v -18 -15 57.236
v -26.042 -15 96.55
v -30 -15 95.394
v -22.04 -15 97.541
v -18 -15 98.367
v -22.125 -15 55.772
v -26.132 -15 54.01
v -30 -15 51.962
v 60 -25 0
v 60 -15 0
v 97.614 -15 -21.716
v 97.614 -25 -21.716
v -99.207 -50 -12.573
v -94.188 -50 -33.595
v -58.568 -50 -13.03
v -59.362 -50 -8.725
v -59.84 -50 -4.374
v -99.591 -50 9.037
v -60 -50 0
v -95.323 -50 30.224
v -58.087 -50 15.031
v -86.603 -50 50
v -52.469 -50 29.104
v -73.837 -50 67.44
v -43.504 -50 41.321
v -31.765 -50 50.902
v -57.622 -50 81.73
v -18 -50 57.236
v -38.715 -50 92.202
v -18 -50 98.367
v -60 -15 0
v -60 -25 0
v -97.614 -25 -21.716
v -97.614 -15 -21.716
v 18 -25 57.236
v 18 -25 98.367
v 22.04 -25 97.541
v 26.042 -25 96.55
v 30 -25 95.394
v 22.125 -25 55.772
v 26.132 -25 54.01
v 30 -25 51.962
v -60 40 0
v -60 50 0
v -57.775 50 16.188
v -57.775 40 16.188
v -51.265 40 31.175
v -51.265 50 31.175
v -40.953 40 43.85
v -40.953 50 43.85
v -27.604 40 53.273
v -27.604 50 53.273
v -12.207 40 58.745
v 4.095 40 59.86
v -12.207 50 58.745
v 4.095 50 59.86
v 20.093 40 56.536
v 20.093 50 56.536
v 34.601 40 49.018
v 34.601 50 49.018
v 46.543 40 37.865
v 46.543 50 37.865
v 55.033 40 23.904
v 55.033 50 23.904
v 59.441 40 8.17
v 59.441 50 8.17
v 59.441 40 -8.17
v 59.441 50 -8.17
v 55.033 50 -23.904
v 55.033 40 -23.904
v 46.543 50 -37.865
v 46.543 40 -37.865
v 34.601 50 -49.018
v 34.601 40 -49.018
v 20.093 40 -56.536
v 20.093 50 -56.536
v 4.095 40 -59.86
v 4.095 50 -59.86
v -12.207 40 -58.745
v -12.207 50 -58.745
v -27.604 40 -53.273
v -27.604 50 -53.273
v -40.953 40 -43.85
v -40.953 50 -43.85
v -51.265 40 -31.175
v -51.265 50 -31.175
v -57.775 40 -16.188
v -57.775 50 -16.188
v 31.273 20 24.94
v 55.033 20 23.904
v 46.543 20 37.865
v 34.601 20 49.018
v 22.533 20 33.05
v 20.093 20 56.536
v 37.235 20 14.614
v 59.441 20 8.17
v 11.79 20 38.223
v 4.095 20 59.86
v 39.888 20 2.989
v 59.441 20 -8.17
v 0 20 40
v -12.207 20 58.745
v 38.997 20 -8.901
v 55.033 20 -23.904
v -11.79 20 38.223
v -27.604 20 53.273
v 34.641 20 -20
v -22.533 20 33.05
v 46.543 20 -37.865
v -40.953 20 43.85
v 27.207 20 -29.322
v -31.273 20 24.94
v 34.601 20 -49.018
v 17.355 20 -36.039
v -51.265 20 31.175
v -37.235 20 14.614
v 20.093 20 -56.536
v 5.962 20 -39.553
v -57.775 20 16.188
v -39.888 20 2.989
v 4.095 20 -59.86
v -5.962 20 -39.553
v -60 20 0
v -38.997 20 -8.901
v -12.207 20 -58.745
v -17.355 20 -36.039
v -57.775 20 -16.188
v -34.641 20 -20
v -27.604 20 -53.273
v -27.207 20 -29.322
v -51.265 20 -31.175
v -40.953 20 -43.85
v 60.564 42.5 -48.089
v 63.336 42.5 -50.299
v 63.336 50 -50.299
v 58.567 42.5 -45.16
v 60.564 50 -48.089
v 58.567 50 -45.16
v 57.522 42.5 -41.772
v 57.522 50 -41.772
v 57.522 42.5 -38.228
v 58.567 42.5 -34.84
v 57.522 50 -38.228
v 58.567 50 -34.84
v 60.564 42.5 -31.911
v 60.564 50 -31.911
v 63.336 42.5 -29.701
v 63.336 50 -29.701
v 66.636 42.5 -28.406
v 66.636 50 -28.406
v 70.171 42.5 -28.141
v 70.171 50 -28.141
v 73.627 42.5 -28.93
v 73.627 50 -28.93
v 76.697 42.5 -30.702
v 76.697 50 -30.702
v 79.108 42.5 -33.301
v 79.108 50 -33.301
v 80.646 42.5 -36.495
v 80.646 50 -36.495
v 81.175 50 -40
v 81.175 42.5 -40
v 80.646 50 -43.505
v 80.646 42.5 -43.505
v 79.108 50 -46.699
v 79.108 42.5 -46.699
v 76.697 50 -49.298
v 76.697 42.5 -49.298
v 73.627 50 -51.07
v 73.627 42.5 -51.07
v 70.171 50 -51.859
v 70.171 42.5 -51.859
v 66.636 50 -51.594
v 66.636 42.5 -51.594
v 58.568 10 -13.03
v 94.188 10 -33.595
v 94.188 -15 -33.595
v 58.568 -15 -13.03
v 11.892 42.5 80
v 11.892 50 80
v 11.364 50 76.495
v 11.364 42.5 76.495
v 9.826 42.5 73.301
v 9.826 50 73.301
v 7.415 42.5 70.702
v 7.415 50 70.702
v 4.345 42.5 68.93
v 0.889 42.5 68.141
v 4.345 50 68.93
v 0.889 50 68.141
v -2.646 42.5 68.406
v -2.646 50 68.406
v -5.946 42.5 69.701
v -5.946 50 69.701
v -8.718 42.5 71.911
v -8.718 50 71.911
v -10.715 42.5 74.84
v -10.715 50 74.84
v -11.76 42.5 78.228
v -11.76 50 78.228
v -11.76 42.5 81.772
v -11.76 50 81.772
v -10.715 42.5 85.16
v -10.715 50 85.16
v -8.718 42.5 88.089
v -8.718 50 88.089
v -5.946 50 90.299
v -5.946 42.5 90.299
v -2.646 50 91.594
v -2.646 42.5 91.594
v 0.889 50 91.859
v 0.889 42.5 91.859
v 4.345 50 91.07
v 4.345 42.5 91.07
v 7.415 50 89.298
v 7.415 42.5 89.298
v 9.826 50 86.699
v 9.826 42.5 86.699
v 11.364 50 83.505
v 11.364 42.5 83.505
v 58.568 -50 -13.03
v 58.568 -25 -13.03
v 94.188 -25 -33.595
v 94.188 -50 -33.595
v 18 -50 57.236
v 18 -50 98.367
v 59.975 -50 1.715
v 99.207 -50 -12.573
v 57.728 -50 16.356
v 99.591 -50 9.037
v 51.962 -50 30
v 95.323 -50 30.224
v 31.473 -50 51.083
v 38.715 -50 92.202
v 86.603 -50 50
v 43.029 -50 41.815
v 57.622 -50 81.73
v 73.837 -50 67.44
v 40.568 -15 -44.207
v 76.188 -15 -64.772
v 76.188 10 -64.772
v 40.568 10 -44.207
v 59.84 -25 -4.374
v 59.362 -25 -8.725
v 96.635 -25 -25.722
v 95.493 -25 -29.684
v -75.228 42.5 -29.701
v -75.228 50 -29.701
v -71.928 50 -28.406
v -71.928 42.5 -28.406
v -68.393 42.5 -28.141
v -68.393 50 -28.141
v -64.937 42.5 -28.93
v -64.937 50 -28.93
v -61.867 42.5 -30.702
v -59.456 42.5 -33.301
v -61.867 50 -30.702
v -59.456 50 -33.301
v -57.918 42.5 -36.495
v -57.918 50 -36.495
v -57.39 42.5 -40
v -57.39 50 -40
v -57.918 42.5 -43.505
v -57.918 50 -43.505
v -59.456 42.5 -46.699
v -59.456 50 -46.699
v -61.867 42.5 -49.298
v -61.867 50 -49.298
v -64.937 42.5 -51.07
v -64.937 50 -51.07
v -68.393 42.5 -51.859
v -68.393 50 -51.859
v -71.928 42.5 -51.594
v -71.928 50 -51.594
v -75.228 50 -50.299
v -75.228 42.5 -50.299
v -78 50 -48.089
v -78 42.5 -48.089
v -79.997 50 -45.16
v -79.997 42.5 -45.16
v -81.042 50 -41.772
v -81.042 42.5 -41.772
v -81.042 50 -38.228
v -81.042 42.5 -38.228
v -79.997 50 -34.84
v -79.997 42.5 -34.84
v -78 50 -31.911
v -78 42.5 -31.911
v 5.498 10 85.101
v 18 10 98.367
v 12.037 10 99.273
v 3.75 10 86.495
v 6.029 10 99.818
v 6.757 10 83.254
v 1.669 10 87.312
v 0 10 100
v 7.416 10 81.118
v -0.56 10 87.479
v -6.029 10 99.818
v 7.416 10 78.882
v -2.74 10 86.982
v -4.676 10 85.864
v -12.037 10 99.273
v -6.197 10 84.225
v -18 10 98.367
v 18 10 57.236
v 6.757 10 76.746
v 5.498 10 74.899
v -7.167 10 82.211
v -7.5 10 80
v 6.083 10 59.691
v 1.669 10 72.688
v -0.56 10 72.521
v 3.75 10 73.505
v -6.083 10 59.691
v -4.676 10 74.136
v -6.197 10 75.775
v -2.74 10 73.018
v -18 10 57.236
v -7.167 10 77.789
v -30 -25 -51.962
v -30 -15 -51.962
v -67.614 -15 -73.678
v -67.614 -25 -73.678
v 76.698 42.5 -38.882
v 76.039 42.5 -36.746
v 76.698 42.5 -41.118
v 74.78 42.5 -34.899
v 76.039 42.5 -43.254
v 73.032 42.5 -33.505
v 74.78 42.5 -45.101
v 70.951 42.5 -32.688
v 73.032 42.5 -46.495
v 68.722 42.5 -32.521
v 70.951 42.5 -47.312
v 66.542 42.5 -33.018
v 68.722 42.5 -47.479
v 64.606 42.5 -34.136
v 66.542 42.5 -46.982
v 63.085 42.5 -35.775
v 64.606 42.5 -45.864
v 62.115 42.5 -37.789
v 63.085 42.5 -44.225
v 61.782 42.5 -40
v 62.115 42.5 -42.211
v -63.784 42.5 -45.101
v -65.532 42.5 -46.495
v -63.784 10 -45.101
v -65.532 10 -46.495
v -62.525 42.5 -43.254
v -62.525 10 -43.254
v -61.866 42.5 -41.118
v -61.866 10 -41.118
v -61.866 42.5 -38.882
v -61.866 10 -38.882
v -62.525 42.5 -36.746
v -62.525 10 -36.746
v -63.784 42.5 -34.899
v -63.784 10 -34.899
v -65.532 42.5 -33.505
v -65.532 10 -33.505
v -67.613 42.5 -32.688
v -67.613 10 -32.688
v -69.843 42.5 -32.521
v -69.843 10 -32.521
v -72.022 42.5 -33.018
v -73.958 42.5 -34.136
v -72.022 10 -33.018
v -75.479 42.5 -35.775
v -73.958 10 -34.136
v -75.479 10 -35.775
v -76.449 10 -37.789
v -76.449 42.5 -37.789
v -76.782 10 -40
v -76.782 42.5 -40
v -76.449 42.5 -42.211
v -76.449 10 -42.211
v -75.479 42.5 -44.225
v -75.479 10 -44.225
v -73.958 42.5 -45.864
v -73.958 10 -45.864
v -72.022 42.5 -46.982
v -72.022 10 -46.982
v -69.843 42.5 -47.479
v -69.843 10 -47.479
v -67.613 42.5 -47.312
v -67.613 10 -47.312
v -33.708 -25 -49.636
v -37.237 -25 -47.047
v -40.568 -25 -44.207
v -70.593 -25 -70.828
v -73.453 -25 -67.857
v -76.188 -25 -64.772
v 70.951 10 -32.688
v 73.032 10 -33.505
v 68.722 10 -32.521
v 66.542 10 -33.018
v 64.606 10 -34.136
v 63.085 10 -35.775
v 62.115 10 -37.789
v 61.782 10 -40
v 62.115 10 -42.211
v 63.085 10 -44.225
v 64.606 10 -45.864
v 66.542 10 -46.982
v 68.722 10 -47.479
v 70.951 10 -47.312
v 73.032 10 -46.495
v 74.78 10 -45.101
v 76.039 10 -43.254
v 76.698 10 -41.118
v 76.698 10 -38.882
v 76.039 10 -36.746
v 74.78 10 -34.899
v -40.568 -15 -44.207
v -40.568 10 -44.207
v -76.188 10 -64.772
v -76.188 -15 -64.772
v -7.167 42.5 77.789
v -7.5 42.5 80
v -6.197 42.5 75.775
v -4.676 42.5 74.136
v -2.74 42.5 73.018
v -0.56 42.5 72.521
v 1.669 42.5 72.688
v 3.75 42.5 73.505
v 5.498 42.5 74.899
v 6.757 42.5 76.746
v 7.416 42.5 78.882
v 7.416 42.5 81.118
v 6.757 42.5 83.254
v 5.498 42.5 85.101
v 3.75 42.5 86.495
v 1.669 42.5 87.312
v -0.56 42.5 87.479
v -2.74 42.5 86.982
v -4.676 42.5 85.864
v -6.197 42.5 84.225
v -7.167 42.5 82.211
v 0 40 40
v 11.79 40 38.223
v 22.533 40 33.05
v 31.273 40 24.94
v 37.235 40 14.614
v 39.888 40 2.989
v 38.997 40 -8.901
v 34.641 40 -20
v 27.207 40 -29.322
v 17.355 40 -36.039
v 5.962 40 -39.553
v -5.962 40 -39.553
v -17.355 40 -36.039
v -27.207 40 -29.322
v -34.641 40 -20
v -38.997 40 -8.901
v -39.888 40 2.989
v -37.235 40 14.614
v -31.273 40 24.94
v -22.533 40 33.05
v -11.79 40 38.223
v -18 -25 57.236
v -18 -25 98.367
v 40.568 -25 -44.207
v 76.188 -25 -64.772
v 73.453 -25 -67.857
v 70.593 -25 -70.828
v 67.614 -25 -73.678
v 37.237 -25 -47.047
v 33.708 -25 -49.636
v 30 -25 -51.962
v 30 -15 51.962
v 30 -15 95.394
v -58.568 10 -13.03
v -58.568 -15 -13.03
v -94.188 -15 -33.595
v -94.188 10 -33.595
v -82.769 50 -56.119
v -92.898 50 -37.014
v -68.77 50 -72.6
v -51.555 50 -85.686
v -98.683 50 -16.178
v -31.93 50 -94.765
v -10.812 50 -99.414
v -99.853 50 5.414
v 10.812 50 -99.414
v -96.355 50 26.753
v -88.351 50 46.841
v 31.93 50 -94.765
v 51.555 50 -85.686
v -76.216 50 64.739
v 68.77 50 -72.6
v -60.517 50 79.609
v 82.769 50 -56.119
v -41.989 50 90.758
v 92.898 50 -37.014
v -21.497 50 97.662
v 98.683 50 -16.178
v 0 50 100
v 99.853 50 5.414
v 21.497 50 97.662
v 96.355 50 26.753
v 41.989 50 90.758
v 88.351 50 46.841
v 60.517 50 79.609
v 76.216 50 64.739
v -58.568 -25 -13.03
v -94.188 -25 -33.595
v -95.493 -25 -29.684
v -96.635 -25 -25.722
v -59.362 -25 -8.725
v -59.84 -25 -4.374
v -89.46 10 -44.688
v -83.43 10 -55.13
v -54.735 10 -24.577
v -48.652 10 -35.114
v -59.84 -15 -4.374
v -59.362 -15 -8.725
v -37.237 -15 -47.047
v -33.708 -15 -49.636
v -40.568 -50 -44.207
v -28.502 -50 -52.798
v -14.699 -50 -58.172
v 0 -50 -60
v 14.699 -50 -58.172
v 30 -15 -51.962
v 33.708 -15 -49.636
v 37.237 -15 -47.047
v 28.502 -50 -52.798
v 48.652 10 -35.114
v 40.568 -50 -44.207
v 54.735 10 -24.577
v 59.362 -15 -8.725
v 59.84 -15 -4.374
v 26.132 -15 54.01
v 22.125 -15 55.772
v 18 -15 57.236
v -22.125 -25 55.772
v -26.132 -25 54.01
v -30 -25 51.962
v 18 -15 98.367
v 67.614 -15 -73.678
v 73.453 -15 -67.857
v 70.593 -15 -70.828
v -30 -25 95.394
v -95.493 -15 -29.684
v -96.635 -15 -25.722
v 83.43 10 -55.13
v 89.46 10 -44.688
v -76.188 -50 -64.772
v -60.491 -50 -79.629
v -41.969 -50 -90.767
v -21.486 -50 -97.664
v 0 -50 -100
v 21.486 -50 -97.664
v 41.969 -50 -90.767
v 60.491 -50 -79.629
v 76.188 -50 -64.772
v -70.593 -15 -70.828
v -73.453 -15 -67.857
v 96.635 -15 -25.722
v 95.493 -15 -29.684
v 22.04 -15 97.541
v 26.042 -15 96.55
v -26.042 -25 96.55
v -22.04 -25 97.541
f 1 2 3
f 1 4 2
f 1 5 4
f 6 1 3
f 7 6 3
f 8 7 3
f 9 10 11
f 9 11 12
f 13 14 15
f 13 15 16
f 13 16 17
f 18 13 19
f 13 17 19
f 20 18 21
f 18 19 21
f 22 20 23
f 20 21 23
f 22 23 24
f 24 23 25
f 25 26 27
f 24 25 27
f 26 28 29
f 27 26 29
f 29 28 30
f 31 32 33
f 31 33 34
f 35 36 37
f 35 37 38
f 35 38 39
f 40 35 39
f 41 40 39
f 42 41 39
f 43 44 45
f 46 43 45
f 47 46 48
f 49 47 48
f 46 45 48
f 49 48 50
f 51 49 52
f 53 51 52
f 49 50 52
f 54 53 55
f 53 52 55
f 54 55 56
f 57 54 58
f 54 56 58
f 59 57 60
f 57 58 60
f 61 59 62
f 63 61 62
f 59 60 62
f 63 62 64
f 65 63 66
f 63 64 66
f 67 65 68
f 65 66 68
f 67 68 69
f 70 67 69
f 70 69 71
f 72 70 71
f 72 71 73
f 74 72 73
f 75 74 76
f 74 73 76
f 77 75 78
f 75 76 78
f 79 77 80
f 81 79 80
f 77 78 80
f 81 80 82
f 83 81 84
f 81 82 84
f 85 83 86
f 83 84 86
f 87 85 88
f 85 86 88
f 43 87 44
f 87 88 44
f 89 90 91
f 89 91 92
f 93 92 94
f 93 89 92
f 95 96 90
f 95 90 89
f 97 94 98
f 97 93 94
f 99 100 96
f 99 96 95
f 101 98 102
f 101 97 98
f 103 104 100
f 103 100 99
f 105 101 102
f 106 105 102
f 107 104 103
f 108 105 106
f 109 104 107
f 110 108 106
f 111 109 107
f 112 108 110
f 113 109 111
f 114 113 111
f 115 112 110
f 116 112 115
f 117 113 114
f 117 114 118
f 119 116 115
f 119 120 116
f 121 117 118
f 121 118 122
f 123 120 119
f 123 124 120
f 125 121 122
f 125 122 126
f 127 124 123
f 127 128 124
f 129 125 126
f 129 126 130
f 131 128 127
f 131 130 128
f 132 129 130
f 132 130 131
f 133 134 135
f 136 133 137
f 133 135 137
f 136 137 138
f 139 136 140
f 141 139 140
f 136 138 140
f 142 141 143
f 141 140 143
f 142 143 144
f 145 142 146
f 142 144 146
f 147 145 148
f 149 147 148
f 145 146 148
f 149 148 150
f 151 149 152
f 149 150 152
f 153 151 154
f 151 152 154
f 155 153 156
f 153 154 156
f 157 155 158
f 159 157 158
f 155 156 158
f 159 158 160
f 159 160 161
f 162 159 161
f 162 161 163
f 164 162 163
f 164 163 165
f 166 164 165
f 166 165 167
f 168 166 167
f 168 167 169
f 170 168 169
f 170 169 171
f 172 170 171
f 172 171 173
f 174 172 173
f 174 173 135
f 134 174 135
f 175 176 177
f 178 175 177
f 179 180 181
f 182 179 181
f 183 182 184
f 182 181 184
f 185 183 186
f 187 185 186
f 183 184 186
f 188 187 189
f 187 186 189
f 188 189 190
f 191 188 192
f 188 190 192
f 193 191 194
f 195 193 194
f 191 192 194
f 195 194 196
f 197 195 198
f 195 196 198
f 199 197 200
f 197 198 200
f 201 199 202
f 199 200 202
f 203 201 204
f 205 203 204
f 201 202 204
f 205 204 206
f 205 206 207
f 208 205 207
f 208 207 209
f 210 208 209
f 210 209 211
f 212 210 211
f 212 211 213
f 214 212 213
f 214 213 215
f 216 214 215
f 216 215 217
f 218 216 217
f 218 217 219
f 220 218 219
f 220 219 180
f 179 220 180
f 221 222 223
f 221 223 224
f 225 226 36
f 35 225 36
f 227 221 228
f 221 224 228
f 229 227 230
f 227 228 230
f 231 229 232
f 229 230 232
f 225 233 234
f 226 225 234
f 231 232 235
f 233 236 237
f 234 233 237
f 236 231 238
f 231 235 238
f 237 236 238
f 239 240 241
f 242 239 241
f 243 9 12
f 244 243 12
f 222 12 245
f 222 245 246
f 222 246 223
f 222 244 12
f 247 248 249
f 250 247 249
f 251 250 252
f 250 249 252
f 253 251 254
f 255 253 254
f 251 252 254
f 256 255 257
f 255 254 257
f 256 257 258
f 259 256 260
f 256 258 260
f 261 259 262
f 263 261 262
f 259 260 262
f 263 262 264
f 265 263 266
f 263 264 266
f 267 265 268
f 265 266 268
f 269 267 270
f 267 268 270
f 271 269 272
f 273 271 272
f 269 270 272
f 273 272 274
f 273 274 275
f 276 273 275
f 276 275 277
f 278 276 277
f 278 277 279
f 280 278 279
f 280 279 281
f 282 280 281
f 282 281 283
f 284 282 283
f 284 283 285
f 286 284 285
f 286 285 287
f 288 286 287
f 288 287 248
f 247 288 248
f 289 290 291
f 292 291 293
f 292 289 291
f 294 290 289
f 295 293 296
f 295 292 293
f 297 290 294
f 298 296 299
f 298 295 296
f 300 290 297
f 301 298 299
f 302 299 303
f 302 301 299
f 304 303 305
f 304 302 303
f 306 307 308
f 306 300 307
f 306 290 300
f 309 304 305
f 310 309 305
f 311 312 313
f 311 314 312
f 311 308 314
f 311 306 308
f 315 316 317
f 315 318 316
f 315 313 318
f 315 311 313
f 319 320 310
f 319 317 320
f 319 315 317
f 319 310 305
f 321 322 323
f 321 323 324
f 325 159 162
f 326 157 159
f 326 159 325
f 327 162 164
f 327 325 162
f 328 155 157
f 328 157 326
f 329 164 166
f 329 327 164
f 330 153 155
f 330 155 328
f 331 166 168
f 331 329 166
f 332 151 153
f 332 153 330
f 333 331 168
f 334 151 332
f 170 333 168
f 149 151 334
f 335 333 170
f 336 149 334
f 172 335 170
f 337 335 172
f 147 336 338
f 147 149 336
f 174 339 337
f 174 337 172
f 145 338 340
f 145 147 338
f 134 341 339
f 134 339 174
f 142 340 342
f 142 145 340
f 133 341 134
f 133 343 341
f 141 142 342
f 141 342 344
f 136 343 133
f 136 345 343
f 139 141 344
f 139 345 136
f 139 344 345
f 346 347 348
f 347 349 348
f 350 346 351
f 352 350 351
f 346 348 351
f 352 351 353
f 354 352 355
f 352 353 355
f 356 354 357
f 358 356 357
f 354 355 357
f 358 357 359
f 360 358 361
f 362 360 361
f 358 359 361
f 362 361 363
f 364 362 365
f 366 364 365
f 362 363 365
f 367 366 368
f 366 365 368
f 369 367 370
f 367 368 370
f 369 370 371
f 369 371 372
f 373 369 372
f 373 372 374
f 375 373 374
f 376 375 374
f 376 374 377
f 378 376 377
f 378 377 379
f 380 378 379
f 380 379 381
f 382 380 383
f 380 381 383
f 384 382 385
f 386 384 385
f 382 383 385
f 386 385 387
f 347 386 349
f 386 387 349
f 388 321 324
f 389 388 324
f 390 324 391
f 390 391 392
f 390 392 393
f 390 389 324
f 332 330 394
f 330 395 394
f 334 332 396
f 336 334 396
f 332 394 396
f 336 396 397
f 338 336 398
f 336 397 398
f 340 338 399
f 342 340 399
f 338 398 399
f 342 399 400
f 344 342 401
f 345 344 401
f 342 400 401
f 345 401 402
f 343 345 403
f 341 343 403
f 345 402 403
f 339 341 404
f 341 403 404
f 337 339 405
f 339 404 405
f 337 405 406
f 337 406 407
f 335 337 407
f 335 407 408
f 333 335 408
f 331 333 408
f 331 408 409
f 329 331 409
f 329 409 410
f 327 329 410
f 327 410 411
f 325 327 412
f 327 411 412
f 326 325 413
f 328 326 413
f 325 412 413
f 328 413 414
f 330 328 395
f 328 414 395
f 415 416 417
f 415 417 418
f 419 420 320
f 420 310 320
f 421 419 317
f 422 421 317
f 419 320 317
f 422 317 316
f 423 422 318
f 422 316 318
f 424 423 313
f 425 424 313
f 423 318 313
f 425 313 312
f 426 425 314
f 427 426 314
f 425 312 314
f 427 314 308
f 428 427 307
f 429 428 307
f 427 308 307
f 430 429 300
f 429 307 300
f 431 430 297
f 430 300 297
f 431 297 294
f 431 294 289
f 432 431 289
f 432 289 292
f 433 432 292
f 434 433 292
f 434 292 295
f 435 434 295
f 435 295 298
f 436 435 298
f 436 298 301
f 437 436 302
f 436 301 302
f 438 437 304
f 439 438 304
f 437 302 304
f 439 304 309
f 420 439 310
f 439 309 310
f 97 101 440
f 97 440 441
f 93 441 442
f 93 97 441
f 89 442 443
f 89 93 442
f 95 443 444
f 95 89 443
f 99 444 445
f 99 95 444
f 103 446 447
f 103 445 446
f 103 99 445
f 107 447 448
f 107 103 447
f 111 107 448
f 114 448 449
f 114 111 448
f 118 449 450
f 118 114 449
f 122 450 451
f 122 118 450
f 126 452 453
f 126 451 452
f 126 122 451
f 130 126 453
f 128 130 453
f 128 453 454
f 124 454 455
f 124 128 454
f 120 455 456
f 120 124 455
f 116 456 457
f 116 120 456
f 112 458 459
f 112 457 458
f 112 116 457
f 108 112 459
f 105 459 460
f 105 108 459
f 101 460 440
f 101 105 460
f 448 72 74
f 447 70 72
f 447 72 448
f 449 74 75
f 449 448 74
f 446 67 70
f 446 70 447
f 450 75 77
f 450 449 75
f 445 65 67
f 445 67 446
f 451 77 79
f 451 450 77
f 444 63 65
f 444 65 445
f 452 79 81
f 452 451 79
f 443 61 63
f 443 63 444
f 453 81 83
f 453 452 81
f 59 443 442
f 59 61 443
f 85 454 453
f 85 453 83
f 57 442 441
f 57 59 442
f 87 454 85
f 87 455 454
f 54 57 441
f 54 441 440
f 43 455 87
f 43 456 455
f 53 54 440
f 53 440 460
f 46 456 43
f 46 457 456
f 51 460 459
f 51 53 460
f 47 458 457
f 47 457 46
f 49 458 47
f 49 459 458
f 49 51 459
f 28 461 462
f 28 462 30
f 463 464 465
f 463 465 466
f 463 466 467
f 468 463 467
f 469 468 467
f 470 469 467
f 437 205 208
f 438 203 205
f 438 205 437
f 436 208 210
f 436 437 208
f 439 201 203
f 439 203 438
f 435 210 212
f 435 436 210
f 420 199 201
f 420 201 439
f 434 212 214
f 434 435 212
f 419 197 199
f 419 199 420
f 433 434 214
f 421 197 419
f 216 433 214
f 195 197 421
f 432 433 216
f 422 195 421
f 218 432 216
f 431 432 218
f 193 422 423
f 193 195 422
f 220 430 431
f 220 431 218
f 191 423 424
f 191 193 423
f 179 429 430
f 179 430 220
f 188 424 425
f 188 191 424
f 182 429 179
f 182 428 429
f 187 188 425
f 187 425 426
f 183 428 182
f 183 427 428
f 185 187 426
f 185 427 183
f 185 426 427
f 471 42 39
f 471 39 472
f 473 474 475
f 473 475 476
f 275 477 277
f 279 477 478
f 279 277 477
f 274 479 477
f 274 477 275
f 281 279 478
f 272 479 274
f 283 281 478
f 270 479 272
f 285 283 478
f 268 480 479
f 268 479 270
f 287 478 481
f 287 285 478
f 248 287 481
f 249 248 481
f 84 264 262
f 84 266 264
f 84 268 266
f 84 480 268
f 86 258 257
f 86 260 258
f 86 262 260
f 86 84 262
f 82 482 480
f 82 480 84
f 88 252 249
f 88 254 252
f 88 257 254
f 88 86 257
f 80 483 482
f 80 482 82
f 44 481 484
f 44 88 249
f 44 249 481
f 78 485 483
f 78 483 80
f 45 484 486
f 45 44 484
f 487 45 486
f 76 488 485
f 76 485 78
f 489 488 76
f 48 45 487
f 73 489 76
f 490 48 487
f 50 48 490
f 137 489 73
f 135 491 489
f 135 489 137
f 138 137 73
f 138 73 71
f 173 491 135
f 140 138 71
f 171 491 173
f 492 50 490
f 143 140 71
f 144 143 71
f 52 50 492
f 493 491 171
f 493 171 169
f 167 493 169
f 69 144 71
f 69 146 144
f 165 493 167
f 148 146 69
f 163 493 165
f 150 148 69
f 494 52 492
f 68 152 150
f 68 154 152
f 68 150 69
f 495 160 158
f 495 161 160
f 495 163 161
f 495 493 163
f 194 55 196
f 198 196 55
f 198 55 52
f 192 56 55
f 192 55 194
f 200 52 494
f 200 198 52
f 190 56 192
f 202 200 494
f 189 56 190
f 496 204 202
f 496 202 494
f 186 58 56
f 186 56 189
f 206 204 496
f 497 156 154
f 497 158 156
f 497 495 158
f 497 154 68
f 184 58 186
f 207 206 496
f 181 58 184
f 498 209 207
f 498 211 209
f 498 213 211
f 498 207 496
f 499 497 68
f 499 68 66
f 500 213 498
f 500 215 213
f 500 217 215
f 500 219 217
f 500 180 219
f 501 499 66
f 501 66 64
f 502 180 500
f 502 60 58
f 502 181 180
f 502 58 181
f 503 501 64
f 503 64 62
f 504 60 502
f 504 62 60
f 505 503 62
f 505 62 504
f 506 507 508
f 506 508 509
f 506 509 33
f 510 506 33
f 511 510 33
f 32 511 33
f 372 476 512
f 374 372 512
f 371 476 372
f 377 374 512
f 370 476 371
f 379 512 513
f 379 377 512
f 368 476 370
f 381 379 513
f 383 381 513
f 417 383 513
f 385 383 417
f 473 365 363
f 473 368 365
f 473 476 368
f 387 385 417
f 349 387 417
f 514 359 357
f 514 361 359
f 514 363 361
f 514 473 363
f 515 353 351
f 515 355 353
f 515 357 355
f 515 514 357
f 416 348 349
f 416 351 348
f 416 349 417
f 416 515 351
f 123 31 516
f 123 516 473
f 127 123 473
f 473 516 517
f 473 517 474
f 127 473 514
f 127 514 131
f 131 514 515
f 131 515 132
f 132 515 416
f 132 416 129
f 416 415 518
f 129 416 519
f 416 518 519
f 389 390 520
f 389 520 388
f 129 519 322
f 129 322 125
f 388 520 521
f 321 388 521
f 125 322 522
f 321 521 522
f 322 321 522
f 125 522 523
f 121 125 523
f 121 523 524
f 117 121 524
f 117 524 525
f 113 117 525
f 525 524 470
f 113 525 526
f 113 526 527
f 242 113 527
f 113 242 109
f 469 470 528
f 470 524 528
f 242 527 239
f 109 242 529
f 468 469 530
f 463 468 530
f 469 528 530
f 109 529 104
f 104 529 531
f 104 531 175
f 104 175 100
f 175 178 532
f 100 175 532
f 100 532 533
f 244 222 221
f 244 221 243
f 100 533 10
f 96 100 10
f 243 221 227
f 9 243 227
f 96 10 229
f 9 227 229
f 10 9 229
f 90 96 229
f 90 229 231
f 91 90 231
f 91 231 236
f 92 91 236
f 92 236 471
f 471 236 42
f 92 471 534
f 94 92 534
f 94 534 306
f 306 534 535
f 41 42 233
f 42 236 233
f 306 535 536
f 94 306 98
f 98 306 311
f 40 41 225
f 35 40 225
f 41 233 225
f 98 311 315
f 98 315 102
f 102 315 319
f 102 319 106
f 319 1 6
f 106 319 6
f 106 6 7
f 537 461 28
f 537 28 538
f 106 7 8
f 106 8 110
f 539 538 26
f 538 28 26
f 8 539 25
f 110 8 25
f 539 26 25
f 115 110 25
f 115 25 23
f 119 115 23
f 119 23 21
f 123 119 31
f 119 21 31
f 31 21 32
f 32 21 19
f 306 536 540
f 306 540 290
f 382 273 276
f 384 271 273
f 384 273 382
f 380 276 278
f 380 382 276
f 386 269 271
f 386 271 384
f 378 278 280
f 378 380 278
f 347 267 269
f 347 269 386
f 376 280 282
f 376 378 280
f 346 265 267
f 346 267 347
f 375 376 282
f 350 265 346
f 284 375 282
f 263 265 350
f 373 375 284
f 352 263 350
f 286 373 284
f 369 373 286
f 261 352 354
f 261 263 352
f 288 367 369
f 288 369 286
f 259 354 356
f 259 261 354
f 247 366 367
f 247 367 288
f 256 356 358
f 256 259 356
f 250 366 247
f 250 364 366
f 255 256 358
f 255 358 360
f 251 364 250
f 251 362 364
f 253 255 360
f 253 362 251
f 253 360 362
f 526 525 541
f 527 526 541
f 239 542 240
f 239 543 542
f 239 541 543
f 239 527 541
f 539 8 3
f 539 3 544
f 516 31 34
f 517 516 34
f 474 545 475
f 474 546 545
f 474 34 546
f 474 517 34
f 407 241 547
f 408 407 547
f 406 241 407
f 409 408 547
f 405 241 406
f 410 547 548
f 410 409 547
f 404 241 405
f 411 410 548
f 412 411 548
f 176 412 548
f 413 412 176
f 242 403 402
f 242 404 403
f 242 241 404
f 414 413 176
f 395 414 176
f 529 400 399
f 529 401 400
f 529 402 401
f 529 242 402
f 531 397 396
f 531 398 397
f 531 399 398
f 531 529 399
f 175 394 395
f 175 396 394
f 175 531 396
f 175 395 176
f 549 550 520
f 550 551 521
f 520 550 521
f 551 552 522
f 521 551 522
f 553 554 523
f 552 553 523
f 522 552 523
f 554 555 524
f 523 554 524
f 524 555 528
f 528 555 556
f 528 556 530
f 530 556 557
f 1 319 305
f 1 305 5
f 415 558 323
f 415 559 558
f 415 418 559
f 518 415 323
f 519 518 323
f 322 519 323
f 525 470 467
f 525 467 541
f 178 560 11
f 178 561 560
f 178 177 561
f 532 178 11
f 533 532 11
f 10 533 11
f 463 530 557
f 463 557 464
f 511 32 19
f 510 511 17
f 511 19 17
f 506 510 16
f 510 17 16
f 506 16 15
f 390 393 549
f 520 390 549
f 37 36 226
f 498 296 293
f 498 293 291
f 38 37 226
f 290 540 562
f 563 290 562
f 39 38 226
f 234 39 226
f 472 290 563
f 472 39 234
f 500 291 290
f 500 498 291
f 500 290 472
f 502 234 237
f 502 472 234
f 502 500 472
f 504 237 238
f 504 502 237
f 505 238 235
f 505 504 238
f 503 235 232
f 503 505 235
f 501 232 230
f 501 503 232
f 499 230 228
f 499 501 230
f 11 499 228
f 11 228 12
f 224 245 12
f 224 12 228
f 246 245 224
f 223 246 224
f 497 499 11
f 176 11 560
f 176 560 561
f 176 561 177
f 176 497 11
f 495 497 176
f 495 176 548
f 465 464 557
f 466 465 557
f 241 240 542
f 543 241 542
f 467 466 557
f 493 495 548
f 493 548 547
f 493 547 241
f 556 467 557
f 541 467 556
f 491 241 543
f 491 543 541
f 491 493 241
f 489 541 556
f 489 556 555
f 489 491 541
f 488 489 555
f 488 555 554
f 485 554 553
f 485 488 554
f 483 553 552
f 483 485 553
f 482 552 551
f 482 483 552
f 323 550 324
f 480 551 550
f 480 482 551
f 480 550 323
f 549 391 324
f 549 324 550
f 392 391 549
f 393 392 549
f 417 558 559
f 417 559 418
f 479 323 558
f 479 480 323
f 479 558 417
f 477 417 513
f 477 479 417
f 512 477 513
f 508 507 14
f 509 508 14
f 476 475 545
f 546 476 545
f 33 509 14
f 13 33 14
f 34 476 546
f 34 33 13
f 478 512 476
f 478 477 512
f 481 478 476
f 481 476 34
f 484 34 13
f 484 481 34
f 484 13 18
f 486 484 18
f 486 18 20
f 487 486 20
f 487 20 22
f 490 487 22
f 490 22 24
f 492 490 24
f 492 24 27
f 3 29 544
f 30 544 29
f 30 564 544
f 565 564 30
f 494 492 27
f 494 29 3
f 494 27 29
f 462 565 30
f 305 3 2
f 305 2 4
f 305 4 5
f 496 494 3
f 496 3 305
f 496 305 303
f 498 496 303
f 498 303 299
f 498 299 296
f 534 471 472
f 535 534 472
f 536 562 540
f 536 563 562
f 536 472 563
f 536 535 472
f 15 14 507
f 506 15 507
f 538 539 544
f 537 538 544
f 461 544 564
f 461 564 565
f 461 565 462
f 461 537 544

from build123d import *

# Parameters (mm, degrees)
SKETCH6_R                                = 100
SKETCH6_R_2                              = 40
BOSS_EXTRUDE2_DEPTH                      = 50
SKETCH7_R                                = 60
CUT_EXTRUDE4_DEPTH                       = 10
SKETCH8_R                                = 60
CUT_EXTRUDE5_DEPTH                       = 70
CUT_EXTRUDE6_DEPTH                       = 101
CBORE_FOR_M12_HEX_HEAD_BOLT1_D           = 15
CBORE_FOR_M12_HEX_HEAD_BOLT1_CBORE_D     = 23.785
CBORE_FOR_M12_HEX_HEAD_BOLT1_CBORE_DEPTH = 7.5
CIRPATTERN2_COUNT                        = 3


with BuildPart() as part:
    # Sketch6 → Boss-Extrude2 (new body, symmetric)
    with BuildSketch(Plane(origin=(0, 0, 0), x_dir=(0, 0, -1), z_dir=(0, 1, 0))):
        with Locations(Location((0, 0, 0), (0, 0, 180))):  # turned: the seam where the file's is
            Circle(SKETCH6_R)
        with Locations(Location((0, 0, 0), (0, 0, 180))):  # turned: the seam where the file's is
            Circle(SKETCH6_R_2, mode=Mode.SUBTRACT)
    extrude(amount=BOSS_EXTRUDE2_DEPTH, both=True)

    # Sketch7 → Cut-Extrude4 (cut)
    with BuildSketch(Plane(origin=(0, 50, 0), x_dir=(0, 0, -1), z_dir=(0, 1, 0))):
        with Locations(Location((0, 0, 0), (0, 0, 90))):  # turned: the seam where the file's is
            Circle(SKETCH7_R)
    extrude(amount=-CUT_EXTRUDE4_DEPTH, mode=Mode.SUBTRACT)

    # Sketch8 → Cut-Extrude5 (cut)
    with BuildSketch(Plane(origin=(0, -50, 0), x_dir=(0, 0, 1), z_dir=(0, -1, 0))):
        with Locations(Location((0, 0, 0), (0, 0, 90))):  # turned: the seam where the file's is
            Circle(SKETCH8_R)
    extrude(amount=-CUT_EXTRUDE5_DEPTH, mode=Mode.SUBTRACT)

    # Sketch9 → Cut-Extrude6 (cut, through all)
    with BuildSketch(Plane(origin=(0, 0, 0), x_dir=(0, -1, 0), z_dir=(0, 0, 1))):
        Polygon((50, -18), (50, 18), (25, 18), (25, 30), (15, 30), (15, 18), (-10, 18), (-10, -18), (15, -18), (15, -30), (25, -30), (25, -18), align=None)
    cut_extrude6 = extrude(amount=CUT_EXTRUDE6_DEPTH, mode=Mode.SUBTRACT)

    # CBORE for M12 Hex Head Bolt1 (through all)
    with Locations(Plane(origin=(0, 50, 0), x_dir=(1, 0, 0), z_dir=(0, 1, 0))):
        with Locations((0, -80)):
            cbore_for_m12_hex_head_bolt1 = CounterBoreHole(CBORE_FOR_M12_HEX_HEAD_BOLT1_D / 2, CBORE_FOR_M12_HEX_HEAD_BOLT1_CBORE_D / 2, CBORE_FOR_M12_HEX_HEAD_BOLT1_CBORE_DEPTH)

    # CirPattern2: Cut-Extrude6, CBORE for M12 Hex Head Bolt1 ×3 about axis
    cirpattern2_axis = Axis((0, 0, 0), (0, 1, 0))
    add([cut_extrude6.rotate(cirpattern2_axis, i * 360 / CIRPATTERN2_COUNT) for i in range(1, CIRPATTERN2_COUNT)], mode=Mode.SUBTRACT)
    add([cbore_for_m12_hex_head_bolt1.rotate(cirpattern2_axis, i * 360 / CIRPATTERN2_COUNT) for i in range(1, CIRPATTERN2_COUNT)], mode=Mode.SUBTRACT)


solid = part.part
